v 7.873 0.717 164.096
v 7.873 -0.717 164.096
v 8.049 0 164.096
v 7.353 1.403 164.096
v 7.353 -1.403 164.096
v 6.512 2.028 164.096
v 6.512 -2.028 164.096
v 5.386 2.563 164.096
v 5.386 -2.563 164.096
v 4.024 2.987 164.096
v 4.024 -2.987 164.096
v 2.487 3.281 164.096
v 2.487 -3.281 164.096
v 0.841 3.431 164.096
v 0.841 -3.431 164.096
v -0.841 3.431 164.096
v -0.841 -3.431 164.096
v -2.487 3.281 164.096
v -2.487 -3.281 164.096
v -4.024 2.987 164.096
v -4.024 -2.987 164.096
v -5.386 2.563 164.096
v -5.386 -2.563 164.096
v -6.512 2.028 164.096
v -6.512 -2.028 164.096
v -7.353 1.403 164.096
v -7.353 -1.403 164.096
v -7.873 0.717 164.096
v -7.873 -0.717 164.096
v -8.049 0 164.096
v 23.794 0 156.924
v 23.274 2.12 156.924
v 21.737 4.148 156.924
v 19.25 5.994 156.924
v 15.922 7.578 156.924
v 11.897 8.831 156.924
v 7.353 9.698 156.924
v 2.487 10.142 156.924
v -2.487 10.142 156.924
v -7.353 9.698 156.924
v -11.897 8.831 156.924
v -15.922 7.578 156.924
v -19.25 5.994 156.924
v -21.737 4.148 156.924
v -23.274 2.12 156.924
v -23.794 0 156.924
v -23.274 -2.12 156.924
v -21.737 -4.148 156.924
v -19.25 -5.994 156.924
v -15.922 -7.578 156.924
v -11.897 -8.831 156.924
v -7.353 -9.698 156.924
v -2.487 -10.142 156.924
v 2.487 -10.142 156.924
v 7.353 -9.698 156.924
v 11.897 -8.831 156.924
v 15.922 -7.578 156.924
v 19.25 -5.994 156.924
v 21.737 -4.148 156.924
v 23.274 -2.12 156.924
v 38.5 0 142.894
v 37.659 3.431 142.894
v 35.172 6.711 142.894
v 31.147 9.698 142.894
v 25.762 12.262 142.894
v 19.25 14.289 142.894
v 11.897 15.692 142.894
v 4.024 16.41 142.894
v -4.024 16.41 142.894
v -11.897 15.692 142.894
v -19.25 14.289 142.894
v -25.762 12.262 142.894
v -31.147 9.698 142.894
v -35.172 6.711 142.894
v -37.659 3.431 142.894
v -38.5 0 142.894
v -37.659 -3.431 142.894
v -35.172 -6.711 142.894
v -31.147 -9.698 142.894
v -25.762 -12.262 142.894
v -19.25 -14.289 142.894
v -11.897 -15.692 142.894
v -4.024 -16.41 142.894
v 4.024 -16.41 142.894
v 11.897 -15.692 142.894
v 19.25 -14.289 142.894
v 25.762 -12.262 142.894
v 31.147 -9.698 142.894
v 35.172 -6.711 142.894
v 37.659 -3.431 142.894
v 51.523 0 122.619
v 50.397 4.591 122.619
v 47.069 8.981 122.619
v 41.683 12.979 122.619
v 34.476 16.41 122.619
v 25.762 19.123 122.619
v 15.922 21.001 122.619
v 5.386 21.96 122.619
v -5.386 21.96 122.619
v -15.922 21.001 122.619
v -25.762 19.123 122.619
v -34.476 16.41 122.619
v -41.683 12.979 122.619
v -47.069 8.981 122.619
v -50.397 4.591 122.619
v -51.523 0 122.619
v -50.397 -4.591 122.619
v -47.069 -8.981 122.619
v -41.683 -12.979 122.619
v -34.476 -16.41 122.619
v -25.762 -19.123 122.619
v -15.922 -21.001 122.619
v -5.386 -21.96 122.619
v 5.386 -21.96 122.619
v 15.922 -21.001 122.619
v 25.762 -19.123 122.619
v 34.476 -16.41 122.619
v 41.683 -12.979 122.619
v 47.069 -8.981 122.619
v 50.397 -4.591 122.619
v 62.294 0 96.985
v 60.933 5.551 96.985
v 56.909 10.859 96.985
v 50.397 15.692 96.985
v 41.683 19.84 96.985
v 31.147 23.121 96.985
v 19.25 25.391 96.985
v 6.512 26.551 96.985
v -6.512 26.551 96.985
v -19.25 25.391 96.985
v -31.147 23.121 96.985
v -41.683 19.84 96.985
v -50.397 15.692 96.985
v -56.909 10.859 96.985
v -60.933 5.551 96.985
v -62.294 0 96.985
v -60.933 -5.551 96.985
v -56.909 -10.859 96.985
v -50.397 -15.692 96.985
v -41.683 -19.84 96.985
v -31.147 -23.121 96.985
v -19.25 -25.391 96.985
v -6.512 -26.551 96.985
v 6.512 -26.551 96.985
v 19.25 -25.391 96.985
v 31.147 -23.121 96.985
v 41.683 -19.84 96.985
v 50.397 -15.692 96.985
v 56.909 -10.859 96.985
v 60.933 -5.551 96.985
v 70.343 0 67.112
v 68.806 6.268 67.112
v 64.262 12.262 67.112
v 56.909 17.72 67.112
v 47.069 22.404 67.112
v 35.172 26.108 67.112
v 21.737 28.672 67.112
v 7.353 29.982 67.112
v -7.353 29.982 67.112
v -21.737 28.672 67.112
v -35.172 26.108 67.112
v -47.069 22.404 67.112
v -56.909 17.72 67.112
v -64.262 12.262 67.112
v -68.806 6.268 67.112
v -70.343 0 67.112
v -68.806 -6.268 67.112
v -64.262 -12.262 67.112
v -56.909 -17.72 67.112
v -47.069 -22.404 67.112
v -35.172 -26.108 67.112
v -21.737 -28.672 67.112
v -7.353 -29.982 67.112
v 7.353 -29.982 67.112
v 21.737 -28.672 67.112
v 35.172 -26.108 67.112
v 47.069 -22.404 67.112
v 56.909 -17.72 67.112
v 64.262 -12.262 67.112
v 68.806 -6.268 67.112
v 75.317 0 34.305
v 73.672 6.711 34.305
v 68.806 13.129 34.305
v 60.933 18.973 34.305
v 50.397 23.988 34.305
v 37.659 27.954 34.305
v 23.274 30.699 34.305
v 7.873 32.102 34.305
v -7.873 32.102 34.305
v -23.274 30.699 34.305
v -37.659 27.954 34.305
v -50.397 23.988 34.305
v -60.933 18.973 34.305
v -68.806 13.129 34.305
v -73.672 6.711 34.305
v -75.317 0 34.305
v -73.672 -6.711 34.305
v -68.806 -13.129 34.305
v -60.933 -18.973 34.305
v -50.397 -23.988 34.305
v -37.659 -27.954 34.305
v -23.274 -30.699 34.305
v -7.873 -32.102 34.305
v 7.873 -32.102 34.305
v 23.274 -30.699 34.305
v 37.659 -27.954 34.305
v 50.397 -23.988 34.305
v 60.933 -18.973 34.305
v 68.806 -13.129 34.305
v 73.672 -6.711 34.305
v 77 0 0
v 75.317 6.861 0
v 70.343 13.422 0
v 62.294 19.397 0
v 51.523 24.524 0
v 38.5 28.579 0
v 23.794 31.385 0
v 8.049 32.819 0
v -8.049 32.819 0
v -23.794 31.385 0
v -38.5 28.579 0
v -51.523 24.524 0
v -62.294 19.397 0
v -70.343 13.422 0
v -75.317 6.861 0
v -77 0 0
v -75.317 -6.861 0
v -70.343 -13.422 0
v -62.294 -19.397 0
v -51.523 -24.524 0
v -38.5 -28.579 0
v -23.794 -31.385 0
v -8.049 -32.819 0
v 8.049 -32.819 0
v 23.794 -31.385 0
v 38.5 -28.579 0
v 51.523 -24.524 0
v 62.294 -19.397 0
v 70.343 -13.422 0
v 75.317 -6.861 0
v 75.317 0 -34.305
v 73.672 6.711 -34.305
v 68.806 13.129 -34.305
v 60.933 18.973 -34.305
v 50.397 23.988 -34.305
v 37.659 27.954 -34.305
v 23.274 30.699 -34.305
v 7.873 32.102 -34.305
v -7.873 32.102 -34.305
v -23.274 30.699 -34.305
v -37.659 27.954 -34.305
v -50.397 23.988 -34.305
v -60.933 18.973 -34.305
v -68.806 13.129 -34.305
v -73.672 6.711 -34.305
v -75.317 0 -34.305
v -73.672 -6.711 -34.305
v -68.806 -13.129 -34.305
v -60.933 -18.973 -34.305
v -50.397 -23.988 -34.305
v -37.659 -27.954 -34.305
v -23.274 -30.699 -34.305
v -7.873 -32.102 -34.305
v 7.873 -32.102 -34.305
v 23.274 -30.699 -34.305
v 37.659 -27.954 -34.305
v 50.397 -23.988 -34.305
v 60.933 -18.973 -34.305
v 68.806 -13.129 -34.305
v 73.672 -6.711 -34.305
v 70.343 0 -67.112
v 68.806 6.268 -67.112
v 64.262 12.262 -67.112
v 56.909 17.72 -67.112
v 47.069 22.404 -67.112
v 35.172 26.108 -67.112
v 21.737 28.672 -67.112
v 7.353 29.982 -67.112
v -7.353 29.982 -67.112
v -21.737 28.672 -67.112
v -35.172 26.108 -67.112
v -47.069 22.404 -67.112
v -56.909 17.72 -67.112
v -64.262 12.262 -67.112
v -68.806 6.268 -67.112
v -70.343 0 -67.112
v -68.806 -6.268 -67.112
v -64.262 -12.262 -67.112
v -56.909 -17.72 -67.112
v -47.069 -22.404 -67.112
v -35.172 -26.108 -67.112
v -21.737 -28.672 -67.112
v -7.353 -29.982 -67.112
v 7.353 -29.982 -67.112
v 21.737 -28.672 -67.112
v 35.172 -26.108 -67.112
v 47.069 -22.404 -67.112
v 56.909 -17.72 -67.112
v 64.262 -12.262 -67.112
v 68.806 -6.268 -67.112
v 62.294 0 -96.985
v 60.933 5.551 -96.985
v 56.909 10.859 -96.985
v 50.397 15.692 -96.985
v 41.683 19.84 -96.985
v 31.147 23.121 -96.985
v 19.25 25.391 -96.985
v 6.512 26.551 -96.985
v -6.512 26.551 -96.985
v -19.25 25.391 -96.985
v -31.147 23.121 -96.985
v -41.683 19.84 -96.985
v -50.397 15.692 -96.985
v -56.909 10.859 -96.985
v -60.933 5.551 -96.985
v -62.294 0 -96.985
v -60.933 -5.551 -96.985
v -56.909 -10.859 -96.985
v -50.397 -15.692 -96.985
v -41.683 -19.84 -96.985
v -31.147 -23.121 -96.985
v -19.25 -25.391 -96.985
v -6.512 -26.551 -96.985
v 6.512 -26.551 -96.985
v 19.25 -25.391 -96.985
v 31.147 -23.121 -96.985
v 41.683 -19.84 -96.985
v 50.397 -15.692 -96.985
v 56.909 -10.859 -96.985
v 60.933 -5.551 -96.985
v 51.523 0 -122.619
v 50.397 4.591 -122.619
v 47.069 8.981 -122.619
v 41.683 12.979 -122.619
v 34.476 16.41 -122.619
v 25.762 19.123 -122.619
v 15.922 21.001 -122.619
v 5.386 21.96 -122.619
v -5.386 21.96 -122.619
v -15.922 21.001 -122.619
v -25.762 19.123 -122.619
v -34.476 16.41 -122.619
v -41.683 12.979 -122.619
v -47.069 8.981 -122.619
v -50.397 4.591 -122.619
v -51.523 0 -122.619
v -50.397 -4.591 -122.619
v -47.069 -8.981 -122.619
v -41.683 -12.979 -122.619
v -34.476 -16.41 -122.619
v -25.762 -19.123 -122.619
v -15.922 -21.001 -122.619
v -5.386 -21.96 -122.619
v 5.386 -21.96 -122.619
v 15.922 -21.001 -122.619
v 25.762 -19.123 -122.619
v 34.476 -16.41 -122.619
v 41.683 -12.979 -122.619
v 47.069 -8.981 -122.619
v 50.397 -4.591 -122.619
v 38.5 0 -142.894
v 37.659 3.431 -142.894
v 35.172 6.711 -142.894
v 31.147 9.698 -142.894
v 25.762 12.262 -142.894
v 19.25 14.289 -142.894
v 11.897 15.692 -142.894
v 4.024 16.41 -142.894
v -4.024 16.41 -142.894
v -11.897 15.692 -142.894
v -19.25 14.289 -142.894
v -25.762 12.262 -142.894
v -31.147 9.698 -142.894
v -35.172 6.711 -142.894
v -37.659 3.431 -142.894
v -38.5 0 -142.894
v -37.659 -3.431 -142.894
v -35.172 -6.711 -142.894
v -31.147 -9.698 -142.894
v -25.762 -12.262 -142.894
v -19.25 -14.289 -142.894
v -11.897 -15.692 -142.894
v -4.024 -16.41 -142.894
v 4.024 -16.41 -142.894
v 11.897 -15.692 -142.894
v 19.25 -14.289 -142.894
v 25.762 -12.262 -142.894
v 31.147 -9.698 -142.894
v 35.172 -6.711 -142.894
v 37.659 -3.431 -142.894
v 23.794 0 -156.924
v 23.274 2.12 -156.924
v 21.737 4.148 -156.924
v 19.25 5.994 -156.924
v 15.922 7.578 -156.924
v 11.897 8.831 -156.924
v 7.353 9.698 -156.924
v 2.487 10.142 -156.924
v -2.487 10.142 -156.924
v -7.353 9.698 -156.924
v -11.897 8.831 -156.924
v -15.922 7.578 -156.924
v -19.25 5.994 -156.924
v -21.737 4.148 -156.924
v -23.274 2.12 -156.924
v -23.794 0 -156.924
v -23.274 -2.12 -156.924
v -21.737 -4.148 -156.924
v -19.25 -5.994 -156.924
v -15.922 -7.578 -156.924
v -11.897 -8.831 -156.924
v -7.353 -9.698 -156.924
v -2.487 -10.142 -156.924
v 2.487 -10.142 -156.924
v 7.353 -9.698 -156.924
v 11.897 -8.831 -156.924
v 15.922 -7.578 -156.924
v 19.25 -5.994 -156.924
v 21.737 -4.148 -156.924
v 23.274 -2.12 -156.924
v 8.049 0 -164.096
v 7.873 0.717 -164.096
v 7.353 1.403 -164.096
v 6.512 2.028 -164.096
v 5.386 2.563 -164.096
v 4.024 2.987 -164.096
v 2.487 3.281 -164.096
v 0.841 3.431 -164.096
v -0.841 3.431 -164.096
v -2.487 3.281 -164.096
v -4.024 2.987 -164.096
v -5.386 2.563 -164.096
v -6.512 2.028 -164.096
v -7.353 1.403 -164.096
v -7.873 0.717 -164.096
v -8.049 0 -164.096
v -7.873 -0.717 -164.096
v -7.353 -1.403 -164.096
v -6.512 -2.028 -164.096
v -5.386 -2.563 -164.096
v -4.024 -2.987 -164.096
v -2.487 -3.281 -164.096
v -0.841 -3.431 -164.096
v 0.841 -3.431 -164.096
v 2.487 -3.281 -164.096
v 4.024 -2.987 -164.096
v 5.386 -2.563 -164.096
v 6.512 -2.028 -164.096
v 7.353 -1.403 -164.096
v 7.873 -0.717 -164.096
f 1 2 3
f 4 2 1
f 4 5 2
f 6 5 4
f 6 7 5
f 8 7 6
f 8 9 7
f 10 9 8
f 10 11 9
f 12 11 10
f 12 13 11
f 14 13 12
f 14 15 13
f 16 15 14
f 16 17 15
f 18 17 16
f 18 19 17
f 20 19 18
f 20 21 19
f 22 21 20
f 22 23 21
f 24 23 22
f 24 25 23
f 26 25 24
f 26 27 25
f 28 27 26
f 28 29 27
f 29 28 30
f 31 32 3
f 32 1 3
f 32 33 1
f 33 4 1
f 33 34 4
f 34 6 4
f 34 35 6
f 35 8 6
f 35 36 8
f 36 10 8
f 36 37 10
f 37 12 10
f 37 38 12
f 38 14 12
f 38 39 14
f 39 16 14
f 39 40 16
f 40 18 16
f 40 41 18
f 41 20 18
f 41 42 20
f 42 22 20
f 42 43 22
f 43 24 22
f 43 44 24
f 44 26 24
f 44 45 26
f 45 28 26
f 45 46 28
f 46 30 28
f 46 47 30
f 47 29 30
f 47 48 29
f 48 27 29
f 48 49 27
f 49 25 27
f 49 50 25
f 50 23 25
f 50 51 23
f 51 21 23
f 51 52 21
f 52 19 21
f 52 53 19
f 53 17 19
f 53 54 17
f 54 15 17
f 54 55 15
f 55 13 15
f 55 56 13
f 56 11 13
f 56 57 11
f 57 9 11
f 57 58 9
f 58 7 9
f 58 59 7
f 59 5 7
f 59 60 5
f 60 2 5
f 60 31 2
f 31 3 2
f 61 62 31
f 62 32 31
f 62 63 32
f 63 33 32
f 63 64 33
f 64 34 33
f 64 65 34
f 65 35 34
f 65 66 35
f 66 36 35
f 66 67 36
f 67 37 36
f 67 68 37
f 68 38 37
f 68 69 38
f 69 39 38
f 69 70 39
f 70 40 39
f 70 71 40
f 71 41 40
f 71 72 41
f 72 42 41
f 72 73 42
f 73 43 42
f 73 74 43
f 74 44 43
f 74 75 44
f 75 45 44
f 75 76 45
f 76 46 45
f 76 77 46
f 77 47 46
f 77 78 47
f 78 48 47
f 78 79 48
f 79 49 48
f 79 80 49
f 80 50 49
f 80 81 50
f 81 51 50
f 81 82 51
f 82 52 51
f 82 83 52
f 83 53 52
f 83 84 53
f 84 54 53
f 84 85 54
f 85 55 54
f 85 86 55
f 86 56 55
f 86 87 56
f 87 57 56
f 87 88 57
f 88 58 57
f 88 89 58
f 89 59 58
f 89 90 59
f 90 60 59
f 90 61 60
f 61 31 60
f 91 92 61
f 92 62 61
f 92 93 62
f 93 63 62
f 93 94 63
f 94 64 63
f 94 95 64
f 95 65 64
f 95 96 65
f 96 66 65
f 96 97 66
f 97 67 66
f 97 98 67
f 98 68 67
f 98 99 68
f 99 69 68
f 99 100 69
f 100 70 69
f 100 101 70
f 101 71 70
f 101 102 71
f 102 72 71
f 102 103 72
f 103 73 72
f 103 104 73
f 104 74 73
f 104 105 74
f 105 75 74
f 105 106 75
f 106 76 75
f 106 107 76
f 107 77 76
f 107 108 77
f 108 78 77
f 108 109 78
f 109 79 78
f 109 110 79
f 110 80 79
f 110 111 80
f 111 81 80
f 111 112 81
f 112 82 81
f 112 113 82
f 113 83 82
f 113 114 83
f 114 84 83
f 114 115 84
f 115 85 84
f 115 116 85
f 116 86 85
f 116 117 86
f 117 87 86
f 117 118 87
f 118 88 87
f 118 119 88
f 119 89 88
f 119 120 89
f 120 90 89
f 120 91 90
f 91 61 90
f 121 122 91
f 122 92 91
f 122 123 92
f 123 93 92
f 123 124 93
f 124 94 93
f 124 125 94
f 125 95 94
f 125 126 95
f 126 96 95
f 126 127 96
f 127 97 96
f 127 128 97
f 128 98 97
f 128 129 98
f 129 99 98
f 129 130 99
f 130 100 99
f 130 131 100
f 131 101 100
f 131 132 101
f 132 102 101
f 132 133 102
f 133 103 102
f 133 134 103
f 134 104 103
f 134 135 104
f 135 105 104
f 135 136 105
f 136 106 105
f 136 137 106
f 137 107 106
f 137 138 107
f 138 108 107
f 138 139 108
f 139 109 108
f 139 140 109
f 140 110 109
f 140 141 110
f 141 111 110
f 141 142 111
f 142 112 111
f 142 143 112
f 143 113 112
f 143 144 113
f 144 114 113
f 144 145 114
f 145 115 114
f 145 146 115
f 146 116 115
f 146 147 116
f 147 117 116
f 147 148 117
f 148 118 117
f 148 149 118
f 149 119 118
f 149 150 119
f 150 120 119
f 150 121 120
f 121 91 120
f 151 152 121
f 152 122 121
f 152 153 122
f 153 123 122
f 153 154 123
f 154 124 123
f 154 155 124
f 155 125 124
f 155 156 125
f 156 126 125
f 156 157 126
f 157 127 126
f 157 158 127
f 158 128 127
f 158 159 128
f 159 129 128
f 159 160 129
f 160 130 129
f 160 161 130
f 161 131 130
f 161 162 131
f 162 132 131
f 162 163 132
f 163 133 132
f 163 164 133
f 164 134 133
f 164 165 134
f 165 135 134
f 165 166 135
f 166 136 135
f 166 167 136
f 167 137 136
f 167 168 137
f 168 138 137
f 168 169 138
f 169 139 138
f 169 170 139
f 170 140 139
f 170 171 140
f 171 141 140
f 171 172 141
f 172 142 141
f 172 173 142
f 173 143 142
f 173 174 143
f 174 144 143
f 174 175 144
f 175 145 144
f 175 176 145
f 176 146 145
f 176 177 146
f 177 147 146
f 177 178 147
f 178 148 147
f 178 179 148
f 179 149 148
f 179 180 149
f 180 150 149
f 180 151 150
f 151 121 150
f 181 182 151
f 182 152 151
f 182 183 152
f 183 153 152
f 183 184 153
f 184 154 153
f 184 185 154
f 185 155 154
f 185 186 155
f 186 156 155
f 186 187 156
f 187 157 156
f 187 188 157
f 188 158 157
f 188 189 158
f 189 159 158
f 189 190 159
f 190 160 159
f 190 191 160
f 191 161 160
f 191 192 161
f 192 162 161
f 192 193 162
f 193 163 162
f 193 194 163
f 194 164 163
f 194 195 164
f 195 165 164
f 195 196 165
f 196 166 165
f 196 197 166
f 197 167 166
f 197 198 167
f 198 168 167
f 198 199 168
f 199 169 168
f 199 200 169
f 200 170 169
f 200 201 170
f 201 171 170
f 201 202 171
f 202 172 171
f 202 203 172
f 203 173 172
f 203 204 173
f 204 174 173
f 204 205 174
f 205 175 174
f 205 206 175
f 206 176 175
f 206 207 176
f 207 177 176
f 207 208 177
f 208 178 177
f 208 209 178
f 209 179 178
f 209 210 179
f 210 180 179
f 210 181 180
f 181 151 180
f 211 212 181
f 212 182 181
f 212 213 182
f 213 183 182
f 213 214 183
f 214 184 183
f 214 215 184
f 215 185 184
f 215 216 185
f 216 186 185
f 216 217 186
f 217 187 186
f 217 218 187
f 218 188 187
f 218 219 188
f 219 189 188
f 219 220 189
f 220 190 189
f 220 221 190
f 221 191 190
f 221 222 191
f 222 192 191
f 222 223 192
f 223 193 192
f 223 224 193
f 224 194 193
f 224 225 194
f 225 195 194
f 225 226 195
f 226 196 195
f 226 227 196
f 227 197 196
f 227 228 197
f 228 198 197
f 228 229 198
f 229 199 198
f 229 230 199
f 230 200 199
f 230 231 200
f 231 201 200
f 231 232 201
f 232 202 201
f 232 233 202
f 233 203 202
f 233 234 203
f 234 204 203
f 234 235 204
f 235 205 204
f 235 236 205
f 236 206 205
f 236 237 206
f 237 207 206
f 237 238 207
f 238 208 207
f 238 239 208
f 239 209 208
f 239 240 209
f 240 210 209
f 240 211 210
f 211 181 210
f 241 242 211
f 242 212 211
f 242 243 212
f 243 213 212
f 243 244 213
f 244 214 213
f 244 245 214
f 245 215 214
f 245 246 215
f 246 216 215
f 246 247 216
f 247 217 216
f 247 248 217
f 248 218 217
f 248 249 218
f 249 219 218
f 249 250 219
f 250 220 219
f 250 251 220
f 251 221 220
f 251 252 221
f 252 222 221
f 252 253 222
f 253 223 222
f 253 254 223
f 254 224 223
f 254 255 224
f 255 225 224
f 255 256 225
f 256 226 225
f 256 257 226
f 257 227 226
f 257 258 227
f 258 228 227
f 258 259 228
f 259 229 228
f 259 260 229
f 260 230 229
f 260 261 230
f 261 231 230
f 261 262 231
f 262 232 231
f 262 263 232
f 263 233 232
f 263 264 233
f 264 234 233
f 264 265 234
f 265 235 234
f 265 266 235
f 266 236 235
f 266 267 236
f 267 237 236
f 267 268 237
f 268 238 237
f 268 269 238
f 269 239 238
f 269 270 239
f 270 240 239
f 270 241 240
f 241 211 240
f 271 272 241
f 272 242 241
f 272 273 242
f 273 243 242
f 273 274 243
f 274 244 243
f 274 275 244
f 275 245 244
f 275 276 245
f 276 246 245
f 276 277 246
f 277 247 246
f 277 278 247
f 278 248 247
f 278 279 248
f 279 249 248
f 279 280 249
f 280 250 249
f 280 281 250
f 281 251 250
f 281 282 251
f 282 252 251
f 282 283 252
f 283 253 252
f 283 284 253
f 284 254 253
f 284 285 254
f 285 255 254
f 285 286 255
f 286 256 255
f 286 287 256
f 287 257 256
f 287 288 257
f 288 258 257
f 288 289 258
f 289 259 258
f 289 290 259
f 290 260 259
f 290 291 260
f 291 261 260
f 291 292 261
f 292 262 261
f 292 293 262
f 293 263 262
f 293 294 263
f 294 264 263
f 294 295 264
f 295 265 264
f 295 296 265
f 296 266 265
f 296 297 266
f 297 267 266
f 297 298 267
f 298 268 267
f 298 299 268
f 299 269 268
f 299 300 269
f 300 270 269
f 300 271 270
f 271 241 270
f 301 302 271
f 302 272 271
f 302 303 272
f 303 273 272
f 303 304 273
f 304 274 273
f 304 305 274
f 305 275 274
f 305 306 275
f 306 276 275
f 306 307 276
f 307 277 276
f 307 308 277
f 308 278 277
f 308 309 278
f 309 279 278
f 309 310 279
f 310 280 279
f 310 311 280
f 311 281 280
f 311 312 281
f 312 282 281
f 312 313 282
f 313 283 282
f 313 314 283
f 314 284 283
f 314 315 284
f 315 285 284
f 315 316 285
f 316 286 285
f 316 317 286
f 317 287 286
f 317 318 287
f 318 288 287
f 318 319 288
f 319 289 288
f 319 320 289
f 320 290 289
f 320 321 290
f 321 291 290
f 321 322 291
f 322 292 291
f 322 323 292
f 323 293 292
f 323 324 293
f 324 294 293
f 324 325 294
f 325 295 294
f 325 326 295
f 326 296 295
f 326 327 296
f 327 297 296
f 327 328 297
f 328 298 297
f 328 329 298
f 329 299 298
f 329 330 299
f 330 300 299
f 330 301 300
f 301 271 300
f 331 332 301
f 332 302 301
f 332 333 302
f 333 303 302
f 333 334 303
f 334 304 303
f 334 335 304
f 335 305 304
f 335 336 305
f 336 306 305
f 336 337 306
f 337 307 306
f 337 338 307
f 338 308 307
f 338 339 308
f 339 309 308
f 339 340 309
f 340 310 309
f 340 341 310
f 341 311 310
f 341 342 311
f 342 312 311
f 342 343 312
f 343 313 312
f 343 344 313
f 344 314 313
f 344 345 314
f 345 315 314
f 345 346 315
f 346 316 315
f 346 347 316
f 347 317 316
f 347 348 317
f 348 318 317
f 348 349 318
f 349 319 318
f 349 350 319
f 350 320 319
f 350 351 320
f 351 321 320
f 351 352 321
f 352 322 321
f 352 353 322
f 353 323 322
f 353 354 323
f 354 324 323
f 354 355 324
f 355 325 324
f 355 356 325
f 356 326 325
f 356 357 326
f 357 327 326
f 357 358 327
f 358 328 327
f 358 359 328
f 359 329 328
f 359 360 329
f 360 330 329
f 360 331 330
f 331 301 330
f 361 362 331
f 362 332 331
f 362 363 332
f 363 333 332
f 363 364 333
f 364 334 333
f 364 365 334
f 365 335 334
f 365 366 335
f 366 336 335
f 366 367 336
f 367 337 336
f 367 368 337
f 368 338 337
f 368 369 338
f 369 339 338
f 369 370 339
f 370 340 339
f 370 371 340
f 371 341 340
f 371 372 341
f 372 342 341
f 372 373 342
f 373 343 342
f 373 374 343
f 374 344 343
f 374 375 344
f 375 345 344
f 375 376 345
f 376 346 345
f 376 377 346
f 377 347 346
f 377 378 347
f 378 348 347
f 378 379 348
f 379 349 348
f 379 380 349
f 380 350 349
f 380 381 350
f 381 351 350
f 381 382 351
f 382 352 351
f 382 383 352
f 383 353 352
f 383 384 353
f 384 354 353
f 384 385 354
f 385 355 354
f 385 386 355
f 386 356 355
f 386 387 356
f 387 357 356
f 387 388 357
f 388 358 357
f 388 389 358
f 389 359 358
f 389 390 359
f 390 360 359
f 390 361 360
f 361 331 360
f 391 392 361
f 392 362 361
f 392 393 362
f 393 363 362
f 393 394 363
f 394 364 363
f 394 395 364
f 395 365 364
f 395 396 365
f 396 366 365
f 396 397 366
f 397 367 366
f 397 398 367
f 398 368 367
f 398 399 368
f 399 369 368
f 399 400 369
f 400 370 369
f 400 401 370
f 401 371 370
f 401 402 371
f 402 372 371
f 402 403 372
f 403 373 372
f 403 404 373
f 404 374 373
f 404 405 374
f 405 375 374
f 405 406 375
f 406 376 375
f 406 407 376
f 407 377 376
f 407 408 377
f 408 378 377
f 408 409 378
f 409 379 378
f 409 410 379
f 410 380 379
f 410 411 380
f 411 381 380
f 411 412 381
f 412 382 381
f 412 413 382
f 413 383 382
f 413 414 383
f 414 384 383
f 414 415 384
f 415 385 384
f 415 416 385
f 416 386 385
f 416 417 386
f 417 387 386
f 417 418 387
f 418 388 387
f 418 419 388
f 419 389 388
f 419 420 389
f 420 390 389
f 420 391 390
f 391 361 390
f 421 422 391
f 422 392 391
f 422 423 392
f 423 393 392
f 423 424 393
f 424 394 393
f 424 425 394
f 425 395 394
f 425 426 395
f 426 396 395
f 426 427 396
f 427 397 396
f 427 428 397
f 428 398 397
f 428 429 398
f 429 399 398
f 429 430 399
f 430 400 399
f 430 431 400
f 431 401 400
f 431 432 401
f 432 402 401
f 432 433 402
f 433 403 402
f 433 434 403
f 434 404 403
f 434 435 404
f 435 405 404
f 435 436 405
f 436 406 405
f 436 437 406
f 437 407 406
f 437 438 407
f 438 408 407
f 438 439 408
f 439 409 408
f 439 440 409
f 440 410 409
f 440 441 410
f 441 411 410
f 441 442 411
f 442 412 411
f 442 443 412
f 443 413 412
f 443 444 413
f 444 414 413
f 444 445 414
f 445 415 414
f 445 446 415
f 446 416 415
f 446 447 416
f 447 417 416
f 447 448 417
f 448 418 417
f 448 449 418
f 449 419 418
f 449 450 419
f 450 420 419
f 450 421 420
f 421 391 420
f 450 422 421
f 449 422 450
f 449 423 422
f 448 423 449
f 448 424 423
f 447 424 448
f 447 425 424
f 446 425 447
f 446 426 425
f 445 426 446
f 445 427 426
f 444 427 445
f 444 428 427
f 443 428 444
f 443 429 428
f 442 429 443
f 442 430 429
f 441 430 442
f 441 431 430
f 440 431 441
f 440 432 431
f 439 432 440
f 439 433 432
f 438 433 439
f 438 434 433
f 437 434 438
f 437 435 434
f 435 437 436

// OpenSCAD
// Generated by SolidPython 1.0.1 on 2020-07-29 00:46:47


scale(v = [7, 3, 15]) {
	sphere(r = 11);
}
/***********************************************
*********      SolidPython code:      **********
************************************************
 
# import packages: SolidPython
from solid import *
from solid.utils import *
from itertools import chain, combinations, permutations


class Resize:

    def __init__(self, scad_file):
        self.scad_file = scad_file
        #self.scad_file = import_scad(scad_file)
        # cone/cylinder param:
        self.r1 = 0
        self.r2 = 0
        self.h = 0
        # rectangular prism param:
        self.w = 0
        self.l = 0
        # ellipse param:
        self.r = 0

    # import OpenScad code (file name corresponds to shape)


    # classify shape + parameters
    def assign(self, param1, param2, param3):
        if self.scad_file == 'cone.scad':
            self.r1 = param1
            self.r2 = param2
            self.h = param3
        elif self.scad_file == 'cylinder.scad':
            self.r1 = param1
            self.r2 = param2
            self.h = param3
        elif self.scad_file == 'rectangularPrism.scad':
            self.h = param1
            self.l = param2
            self.w = param3
        else:
            self.r = param1
            self.h = param2

    # resize parameters
    def iterate(self):
        x = range(3, 20, 2)
        i = 1
        if self.scad_file == 'cone.scad':
            tempList = list(permutations(x, 2))
            for temp in tempList:
                param1 = temp[0]
                param2 = temp[1]
                filepath = 'produced_scad_files/' + 'cone' + str(param1) + '_' + str(param2) + '_' + '.scad'
                scad_render_to_file(cylinder(h=param1, r1=param2, r2=0), filepath)

        elif self.scad_file == 'cylinder.scad':
            tempList = list(permutations(x, 3))
            for temp in tempList:
                param1 = temp[0]
                param2 = temp[1]
                filepath = 'produced_scad_files/' + 'cylinder' + str(param1) + '_' + str(param2) + '_' + '.scad'
                scad_render_to_file(cylinder(h=param1, r1=param2, r2=param2), filepath)

        elif self.scad_file == 'rectangularPrism.scad':
            tempList = list(permutations(x, 3))
            for temp in tempList:
                param1 = temp[0]
                param2 = temp[1]
                param3 = temp[2]
                filepath = 'produced_scad_files/' + 'rectangularPrism' + str(param1) + '_' + str(param2) + '_' + str(
                    param3) + '.scad'
                scad_render_to_file(cube(size=(param1, param2, param3)), filepath)

        elif self.scad_file == 'ellipse.scad':
            tempList = list(permutations(x, 4))
            for temp in tempList:
                param1 = temp[0]
                param2 = temp[1]
                param3 = temp[2]
                param4 = temp[3]
                filepath = 'produced_scad_files/' + 'ellipse' + str(param1) + '_' + str(param2) + '_' + str(param3) + '_' + str(param4) + '.scad'
                scad_render_to_file(scale([param1, param2, param3])(sphere(r=param4)), filepath)

    def render_to_scadfile(self):
        scad_render_to_file(scad, 'example.scad') 
 
************************************************/
